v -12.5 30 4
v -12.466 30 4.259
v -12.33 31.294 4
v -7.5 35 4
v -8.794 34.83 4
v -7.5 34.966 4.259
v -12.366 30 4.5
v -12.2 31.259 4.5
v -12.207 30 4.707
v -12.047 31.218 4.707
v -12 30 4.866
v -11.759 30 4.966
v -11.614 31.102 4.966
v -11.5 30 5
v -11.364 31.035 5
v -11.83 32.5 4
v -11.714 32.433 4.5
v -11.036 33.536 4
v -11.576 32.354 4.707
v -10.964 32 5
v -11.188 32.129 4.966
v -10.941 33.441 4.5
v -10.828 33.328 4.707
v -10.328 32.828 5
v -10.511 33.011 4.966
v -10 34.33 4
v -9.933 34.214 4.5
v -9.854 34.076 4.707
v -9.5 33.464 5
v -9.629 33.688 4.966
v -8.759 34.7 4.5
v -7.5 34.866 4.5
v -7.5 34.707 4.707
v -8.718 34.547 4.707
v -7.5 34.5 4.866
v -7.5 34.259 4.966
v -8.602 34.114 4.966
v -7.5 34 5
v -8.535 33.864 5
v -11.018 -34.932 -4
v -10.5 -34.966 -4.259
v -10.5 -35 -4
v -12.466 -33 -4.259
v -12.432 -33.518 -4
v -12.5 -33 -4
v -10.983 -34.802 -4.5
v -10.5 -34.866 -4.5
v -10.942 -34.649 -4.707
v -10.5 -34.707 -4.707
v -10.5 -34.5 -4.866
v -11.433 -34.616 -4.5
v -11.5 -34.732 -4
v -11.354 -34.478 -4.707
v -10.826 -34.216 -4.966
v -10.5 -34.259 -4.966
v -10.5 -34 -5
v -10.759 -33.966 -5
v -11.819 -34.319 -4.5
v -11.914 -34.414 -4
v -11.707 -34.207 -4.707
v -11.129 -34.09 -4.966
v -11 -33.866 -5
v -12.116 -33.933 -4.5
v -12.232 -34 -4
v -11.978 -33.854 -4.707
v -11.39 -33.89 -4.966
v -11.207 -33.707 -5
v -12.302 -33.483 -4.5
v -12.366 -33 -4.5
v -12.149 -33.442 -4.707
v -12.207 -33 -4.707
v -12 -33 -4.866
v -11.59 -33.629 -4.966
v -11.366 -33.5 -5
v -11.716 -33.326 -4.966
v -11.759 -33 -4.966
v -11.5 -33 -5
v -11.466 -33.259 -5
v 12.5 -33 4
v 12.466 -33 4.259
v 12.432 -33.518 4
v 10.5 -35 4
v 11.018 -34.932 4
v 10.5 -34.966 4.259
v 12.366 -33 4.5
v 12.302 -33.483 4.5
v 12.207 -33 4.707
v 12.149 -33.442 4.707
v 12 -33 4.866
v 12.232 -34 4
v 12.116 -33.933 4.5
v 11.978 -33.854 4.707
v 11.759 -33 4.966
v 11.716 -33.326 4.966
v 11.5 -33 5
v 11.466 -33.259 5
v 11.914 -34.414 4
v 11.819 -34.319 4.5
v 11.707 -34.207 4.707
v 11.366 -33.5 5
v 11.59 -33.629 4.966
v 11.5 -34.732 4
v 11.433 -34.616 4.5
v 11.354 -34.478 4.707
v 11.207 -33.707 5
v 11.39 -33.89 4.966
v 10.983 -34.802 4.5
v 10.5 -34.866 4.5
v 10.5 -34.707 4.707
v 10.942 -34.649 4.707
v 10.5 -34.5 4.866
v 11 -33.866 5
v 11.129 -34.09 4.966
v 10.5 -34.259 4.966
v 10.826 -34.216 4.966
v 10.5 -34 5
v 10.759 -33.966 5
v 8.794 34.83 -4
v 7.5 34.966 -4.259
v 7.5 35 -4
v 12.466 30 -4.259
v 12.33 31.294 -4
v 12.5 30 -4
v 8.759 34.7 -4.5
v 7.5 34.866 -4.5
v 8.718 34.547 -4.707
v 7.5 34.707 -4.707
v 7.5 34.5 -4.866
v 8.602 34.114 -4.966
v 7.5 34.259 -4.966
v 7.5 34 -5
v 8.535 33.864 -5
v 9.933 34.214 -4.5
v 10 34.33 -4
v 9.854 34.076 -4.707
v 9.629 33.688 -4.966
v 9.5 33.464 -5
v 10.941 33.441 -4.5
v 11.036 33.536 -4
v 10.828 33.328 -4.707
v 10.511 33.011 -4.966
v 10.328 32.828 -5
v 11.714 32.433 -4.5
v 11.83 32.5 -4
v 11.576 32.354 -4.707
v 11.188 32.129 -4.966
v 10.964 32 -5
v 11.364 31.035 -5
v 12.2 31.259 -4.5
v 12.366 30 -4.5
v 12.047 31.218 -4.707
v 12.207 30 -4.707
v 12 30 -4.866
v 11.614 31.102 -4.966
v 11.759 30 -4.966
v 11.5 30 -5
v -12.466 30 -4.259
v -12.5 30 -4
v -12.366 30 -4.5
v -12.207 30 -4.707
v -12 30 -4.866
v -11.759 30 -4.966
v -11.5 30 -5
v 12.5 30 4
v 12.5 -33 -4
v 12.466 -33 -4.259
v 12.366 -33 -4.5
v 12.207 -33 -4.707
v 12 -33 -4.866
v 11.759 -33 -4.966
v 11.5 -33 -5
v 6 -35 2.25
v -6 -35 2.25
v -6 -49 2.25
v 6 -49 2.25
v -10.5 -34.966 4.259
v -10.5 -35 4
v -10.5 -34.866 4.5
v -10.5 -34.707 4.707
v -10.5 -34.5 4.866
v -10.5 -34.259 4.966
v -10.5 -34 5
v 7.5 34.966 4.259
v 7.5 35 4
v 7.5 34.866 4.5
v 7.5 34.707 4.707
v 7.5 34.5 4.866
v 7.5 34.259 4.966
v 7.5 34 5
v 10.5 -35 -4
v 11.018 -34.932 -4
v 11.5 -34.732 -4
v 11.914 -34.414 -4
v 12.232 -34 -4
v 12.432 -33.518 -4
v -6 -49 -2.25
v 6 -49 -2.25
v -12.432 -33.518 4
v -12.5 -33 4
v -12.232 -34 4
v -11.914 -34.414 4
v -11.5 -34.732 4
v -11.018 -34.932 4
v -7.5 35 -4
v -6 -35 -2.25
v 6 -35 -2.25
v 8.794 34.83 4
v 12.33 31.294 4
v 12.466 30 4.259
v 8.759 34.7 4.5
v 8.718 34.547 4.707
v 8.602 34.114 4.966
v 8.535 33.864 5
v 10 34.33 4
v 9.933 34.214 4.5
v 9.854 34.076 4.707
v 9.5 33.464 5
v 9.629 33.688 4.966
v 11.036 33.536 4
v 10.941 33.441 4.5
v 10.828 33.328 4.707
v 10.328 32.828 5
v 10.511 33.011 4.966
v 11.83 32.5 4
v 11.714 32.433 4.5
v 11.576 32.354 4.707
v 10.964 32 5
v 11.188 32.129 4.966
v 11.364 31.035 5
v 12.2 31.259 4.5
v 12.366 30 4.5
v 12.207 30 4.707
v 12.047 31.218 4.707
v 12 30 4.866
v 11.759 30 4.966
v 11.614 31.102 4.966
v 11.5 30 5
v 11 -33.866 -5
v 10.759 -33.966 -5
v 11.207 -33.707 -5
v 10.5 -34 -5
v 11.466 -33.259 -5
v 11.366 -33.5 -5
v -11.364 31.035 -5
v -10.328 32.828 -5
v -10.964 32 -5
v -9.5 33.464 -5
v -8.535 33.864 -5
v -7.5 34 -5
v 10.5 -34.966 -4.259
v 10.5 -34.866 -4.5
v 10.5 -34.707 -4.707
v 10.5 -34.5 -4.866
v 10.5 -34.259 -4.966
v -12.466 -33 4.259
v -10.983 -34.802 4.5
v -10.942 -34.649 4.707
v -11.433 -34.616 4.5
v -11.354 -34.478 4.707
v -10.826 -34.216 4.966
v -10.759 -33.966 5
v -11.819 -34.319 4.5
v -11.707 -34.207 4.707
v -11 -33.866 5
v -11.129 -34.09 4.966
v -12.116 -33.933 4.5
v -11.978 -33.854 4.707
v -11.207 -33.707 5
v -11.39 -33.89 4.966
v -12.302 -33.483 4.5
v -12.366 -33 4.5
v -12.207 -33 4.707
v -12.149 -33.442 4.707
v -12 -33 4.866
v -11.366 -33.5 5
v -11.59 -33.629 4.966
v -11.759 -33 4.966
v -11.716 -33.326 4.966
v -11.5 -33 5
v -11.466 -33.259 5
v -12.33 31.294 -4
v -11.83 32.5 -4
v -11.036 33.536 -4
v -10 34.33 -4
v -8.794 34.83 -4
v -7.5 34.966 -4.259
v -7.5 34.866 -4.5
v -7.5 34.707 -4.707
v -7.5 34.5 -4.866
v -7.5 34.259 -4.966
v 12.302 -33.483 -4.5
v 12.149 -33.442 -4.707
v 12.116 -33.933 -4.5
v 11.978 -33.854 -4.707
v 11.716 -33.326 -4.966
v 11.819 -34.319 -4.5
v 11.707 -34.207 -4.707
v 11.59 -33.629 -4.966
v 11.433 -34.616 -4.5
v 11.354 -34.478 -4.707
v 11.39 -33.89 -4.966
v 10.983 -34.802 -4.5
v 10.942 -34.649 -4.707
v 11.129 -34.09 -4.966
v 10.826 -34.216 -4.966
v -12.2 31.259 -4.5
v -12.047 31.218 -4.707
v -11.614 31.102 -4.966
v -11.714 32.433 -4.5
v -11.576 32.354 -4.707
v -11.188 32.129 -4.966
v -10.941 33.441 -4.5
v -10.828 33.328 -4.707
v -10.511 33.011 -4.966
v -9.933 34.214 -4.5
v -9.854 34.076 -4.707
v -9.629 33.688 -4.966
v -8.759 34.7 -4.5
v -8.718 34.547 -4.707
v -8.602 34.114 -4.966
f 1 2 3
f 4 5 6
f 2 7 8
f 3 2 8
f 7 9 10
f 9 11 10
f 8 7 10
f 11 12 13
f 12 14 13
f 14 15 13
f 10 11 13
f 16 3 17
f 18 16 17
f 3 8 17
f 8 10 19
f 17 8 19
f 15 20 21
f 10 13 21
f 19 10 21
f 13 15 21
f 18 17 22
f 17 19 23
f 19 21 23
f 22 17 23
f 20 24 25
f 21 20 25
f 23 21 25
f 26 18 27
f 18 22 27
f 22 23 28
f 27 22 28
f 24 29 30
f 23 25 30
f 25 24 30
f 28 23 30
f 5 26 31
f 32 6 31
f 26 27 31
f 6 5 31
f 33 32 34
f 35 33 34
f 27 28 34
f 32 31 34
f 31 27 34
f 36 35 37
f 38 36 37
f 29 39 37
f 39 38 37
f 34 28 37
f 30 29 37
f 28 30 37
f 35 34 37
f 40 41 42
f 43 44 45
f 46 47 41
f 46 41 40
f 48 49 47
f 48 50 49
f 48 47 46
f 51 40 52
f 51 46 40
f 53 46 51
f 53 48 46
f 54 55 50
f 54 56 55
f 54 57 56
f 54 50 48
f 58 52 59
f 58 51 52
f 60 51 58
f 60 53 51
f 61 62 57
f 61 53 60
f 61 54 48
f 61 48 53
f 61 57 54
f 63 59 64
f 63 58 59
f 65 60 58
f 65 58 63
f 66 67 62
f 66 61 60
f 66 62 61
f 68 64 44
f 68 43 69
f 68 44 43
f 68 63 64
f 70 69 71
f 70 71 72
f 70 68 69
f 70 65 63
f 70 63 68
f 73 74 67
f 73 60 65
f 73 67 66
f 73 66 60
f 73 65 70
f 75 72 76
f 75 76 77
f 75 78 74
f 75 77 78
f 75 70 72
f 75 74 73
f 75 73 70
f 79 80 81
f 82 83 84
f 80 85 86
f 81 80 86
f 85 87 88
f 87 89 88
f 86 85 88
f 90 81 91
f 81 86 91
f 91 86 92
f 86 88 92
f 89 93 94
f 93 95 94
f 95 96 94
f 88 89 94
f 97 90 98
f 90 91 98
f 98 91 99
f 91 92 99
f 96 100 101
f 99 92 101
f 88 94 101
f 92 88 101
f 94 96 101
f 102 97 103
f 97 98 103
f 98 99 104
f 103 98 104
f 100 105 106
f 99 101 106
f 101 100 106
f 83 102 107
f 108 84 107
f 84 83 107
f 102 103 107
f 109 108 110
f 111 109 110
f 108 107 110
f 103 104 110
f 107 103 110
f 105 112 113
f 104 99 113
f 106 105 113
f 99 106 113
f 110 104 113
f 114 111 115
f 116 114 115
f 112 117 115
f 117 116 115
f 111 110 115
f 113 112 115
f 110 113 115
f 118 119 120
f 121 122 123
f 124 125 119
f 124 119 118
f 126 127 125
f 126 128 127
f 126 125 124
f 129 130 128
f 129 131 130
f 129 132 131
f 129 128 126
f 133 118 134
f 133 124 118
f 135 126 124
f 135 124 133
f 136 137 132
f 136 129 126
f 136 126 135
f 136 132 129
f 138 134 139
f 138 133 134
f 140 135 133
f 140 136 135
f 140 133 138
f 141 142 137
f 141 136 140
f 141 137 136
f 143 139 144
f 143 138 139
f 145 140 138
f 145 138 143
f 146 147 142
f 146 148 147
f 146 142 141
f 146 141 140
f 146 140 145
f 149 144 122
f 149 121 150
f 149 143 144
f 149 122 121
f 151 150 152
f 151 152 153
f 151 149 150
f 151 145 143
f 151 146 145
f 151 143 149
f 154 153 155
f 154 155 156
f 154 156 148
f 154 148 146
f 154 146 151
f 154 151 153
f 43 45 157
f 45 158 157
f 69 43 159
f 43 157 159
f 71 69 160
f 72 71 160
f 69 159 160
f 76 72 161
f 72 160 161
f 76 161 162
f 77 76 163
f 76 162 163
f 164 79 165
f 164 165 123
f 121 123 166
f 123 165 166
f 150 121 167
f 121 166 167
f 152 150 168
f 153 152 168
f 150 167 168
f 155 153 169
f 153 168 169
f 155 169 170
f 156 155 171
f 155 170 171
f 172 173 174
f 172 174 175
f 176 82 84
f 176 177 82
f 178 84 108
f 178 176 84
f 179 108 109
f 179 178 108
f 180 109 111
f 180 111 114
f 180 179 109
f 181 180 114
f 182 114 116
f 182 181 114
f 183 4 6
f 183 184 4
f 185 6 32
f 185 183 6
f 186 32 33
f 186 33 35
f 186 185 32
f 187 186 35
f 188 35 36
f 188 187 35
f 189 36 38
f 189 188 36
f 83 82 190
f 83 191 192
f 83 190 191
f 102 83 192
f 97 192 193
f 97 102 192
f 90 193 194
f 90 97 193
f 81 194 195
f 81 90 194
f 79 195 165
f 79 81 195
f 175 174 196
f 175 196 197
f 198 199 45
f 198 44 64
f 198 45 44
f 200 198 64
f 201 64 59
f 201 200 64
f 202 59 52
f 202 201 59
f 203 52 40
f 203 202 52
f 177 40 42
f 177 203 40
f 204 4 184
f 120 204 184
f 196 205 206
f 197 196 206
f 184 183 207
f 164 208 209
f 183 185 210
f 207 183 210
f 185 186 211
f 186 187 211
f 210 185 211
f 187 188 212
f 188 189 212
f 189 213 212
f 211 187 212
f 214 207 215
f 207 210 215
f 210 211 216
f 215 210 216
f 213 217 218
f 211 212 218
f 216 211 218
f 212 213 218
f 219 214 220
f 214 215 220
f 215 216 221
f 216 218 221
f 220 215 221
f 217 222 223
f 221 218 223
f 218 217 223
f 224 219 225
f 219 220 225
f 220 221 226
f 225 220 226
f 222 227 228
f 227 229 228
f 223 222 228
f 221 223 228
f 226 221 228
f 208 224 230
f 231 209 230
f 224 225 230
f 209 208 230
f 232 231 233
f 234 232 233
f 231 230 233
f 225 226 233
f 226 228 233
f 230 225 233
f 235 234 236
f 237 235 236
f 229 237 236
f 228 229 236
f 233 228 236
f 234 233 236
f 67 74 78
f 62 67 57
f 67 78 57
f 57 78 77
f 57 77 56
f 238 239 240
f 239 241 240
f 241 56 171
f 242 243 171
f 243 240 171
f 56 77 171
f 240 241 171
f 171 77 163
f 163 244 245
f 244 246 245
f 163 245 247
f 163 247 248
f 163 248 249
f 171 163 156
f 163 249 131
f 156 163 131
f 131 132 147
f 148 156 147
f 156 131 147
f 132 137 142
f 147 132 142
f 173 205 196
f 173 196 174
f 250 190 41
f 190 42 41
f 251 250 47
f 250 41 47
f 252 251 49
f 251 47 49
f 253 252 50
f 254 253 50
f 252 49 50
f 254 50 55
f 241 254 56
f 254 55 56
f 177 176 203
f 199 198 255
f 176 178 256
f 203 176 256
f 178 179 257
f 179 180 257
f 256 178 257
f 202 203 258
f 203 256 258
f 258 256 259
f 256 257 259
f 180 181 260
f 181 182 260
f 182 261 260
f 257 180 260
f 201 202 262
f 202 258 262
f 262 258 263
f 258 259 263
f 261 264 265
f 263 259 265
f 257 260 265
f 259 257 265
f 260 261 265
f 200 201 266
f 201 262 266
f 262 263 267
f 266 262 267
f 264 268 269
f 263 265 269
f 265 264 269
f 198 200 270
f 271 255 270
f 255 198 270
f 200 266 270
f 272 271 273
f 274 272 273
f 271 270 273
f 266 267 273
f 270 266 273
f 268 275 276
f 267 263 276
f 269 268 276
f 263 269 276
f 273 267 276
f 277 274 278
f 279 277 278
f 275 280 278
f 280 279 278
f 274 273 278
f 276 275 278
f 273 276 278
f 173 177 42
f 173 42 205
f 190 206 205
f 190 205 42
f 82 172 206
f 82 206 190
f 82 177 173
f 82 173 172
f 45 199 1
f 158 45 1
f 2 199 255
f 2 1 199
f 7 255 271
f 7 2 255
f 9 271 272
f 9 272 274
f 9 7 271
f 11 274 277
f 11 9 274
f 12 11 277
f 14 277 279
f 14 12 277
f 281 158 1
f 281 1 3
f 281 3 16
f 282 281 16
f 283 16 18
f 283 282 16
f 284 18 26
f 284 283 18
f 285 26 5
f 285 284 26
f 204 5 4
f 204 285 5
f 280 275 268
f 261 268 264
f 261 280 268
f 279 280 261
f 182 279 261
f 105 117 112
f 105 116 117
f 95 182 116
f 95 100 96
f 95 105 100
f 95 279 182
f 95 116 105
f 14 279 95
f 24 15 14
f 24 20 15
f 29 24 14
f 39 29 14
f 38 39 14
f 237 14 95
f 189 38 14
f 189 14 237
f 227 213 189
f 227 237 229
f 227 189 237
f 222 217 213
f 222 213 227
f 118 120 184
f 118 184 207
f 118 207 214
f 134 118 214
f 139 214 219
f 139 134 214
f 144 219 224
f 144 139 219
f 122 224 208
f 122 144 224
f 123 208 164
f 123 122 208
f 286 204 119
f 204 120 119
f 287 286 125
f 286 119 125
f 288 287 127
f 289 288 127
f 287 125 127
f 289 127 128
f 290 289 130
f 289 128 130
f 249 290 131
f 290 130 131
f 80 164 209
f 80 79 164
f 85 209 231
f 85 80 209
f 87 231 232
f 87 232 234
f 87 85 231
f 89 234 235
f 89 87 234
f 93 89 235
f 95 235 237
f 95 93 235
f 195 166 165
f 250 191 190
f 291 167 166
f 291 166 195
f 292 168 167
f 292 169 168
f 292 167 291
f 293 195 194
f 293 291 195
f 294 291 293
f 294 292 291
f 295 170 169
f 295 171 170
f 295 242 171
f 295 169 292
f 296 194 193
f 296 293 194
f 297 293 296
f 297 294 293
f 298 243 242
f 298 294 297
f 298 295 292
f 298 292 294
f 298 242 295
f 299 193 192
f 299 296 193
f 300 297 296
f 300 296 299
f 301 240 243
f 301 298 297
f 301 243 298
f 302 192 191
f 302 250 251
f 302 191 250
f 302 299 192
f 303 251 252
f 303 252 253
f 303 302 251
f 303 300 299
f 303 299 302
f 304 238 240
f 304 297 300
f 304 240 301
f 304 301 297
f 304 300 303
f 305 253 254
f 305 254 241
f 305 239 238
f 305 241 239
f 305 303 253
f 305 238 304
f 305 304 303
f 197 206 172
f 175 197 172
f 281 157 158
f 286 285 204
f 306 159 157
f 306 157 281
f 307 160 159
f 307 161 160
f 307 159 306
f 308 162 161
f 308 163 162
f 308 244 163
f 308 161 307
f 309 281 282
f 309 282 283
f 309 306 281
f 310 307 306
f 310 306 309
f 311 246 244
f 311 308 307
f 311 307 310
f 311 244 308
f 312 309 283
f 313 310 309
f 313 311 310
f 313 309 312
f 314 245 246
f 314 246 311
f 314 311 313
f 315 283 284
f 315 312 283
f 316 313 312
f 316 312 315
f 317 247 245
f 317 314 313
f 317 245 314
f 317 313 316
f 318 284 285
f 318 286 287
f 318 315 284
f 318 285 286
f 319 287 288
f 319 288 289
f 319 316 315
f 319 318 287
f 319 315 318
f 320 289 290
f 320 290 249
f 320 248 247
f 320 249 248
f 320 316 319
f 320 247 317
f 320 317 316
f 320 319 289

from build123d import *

# Parameters (mm, degrees)
F0_W     = 25
F0_H     = 70
F1_DEPTH = 5
F2_W     = 12
F2_H     = 4.5
F3_DEPTH = 14
F4_R     = 2
F5_R     = 5
F6_R     = 1


with BuildPart() as f1:
    # F0 (on Top) → F1 (new body, symmetric)
    with BuildSketch(Plane.XY):
        Rectangle(F0_W, F0_H)
    extrude(amount=F1_DEPTH, both=True)

    # F2 (on face) → F3 (join)
    with BuildSketch(Plane.XZ.offset(35)):
        Rectangle(F2_W, F2_H)
    extrude(amount=F3_DEPTH)

    # F4
    f4_edges = [f1.edges().sort_by_distance(p)[0] for p in [
        (12.5, -35, 0),
        (-12.5, -35, 0),
    ]]
    fillet(f4_edges, radius=F4_R)

    # F5
    f5_edges = [f1.edges().sort_by_distance(p)[0] for p in [
        (12.5, 35, 0),
        (-12.5, 35, 0),
    ]]
    fillet(f5_edges, radius=F5_R)

    # F6
    f6_edges = [f1.edges().sort_by_distance(p)[0] for p in [
        (-12.5, -1.5, 5),
        (-11.035534, 33.535534, 5),
        (-11.914214, -34.414214, 5),
        (0, 35, 5),
        (0, -35, 5),
        (11.035534, 33.535534, 5),
        (11.914214, -34.414214, 5),
        (12.5, -1.5, 5),
        (-12.5, -1.5, -5),
        (-11.035534, 33.535534, -5),
        (-11.914214, -34.414214, -5),
        (0, 35, -5),
        (0, -35, -5),
        (11.035534, 33.535534, -5),
        (11.914214, -34.414214, -5),
        (12.5, -1.5, -5),
    ]]
    fillet(f6_edges, radius=F6_R)


solid = f1.part
